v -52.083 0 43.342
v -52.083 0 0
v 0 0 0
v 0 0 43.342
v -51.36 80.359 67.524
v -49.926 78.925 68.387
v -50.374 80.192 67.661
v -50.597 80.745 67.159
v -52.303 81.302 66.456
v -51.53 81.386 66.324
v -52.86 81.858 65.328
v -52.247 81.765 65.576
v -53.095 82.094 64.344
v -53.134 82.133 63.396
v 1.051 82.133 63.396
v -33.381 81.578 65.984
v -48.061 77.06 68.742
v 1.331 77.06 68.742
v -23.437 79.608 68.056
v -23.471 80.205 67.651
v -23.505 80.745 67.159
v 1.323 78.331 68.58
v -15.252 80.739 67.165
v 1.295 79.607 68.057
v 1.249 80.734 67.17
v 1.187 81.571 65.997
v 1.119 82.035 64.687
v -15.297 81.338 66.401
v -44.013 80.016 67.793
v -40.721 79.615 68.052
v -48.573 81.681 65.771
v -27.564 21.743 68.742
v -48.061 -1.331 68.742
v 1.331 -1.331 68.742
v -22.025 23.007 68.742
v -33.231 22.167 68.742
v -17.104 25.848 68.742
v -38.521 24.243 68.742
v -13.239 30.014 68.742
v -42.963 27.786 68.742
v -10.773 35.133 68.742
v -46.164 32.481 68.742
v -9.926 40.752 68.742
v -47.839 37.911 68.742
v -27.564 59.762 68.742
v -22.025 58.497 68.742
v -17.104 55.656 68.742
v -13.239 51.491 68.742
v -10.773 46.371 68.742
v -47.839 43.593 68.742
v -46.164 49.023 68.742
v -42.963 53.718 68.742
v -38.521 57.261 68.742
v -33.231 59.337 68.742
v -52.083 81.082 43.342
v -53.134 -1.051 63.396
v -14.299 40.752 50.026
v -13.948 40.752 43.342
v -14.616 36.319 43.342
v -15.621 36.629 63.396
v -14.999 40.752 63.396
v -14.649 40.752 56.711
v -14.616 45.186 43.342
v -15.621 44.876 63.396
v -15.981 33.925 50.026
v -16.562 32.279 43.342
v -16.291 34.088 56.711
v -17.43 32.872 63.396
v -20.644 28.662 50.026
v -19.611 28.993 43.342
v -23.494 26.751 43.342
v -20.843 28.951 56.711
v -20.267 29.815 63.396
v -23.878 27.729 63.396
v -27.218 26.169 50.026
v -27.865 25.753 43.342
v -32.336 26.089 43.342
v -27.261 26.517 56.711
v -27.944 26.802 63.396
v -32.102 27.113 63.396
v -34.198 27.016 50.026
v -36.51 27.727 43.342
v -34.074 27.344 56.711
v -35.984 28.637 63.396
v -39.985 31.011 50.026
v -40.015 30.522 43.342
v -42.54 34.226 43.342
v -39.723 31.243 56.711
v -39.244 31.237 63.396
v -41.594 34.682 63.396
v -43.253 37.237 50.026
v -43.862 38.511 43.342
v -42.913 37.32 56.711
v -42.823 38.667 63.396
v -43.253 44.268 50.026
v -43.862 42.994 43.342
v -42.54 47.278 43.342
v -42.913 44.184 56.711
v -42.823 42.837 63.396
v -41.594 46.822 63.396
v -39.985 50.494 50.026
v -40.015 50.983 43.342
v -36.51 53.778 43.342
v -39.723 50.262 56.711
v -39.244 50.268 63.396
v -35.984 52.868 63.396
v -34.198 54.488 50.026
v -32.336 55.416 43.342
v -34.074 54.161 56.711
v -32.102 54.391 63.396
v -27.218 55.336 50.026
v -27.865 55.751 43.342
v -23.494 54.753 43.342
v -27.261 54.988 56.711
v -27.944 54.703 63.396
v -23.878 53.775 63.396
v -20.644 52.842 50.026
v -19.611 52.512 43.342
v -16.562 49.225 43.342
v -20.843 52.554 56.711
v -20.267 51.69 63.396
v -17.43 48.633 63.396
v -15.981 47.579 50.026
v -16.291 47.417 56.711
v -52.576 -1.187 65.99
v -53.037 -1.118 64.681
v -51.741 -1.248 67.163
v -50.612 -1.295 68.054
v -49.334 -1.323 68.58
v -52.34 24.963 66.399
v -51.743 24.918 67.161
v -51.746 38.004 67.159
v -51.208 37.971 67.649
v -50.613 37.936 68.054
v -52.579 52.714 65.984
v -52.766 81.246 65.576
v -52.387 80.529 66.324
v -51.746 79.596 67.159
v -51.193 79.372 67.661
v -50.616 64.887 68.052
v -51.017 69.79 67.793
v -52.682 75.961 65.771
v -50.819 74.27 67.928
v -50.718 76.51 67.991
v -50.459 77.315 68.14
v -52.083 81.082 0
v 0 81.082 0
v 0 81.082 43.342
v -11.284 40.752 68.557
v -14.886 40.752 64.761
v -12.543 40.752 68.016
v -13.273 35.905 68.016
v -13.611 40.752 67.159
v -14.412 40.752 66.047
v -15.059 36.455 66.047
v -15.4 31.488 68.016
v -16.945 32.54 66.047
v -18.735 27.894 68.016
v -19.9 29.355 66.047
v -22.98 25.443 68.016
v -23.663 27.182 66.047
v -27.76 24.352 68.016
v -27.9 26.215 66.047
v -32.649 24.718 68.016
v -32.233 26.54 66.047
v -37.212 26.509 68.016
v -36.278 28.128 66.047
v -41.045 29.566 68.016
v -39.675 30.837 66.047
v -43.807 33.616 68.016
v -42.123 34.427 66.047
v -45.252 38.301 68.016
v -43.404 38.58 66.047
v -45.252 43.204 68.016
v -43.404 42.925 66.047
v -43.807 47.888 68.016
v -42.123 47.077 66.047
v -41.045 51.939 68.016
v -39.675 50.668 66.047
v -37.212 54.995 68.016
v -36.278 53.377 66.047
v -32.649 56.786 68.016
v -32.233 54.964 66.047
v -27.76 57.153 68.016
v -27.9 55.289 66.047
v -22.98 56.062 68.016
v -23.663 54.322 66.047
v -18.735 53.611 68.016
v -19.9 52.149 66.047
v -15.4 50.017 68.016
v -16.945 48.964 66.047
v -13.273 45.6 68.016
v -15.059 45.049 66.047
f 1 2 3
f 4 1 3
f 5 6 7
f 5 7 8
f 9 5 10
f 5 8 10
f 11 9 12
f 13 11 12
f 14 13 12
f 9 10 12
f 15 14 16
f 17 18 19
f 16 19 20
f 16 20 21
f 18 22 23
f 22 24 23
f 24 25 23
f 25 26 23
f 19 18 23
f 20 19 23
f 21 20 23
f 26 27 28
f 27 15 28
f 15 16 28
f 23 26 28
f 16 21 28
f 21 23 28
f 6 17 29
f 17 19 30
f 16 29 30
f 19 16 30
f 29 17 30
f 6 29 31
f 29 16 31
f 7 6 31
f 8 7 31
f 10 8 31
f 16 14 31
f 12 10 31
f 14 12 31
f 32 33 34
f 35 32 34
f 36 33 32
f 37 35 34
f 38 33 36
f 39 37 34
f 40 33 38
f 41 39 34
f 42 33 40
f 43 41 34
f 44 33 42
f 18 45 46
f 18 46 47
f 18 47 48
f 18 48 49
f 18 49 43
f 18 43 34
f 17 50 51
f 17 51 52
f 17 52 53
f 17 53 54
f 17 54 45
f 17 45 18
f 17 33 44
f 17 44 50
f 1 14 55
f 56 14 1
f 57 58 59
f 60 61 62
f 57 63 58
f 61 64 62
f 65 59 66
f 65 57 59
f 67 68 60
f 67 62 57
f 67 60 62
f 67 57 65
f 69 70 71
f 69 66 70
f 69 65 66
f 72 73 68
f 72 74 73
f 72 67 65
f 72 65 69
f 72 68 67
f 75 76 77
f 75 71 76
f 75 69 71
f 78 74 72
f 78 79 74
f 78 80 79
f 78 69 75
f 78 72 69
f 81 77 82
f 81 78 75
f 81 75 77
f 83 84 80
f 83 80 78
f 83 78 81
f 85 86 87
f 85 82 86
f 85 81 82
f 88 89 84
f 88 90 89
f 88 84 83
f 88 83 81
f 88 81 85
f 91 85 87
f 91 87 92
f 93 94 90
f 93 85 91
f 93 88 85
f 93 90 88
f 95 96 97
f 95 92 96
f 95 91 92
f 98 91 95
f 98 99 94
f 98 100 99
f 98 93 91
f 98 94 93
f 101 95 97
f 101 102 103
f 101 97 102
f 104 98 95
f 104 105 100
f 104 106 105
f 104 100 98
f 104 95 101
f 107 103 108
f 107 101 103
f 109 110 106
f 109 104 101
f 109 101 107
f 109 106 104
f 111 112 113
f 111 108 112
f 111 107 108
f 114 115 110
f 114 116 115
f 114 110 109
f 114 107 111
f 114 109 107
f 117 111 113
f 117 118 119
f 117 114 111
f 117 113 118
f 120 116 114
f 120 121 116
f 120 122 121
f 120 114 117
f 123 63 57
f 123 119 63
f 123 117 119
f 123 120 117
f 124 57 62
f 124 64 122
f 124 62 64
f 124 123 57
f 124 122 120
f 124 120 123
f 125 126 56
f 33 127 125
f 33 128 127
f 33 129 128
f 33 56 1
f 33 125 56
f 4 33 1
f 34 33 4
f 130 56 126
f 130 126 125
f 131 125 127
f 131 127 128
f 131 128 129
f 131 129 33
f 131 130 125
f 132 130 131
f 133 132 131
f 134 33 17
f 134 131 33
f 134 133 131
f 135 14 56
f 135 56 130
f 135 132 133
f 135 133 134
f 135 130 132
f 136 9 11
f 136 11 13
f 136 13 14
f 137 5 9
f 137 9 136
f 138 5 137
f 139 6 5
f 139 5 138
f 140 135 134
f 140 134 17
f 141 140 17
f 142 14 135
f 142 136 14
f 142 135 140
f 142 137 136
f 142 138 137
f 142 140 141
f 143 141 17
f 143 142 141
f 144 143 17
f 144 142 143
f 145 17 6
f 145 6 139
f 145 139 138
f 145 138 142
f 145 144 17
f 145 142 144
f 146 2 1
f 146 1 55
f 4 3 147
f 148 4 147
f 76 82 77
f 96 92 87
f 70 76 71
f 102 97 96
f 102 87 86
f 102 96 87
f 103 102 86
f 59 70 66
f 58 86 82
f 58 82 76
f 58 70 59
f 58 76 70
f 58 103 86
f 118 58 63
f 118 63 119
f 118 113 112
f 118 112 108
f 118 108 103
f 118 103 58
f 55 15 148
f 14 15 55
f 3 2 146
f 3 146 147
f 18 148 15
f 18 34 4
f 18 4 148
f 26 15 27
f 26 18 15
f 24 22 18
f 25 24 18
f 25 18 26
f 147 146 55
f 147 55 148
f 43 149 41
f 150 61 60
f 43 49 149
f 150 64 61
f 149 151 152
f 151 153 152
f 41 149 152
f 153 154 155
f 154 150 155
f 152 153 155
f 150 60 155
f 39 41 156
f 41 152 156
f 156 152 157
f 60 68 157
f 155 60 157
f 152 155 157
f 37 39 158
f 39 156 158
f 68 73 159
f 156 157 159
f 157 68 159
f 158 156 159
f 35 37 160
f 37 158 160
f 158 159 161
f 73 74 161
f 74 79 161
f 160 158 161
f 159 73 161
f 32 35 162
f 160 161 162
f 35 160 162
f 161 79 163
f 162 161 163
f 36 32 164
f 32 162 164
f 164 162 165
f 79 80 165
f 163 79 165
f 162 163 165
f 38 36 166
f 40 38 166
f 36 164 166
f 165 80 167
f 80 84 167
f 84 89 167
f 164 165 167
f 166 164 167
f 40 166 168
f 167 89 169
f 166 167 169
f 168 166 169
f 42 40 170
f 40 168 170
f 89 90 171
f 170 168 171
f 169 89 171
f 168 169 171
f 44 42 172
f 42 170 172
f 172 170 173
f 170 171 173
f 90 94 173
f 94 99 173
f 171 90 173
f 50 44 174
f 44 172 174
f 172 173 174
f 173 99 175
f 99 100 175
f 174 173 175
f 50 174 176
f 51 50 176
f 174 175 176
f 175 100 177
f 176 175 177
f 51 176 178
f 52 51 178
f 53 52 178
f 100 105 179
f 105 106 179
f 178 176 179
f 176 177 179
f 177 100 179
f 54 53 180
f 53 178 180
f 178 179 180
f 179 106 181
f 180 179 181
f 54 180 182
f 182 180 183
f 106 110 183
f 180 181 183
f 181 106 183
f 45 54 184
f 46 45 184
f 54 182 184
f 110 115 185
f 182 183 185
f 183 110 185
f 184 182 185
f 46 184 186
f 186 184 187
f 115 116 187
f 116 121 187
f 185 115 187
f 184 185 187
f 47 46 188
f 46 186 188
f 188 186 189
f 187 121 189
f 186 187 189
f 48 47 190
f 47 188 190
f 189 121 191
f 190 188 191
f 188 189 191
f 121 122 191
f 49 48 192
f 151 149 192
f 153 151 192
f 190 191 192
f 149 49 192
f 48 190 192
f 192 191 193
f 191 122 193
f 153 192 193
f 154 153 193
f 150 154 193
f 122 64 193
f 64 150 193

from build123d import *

# Parameters (mm, degrees)
F0_W     = 52.0827807486
F0_H     = 81.0816735029
F1_DEPTH = 43.3417446911
F2_W     = 52.0827807486
F2_H     = 81.0816735029
F2_R     = 15.0408824119
F3_DEPTH = 25.4
F3_TAPER = -3
F4_R     = 5.08
F5_R     = 5.08


with BuildPart() as f1:
    # F0 (on Top) → F1 (new body)
    with BuildSketch(Plane.XY):
        with Locations((-26.0413903743, 40.5408367515)):
            Rectangle(F0_W, F0_H)
    extrude(amount=F1_DEPTH)

    # F2 (on face) → F3 (join)
    with BuildSketch(Plane.XY.offset(43.3417446911)):
        with Locations((-26.0413903743, 40.5408367515)):
            Rectangle(F2_W, F2_H)
        with Locations((-28.9890691638, 40.7522916794)):
            Circle(F2_R, mode=Mode.SUBTRACT)
    extrude(amount=F3_DEPTH, taper=F3_TAPER)

    # F4
    f4_edges = [f1.edges().sort_by_distance(p)[0] for p in [
        (-26.04139, 82.412831, 68.741745),
        (-53.413938, 40.540837, 68.741745),
    ]]
    fillet(f4_edges, radius=F4_R)

    # F5
    f5_edges = [f1.edges().sort_by_distance(p)[0] for p in [
        (-42.698794, 40.752292, 68.741745),
    ]]
    fillet(f5_edges, radius=F5_R)


solid = f1.part
